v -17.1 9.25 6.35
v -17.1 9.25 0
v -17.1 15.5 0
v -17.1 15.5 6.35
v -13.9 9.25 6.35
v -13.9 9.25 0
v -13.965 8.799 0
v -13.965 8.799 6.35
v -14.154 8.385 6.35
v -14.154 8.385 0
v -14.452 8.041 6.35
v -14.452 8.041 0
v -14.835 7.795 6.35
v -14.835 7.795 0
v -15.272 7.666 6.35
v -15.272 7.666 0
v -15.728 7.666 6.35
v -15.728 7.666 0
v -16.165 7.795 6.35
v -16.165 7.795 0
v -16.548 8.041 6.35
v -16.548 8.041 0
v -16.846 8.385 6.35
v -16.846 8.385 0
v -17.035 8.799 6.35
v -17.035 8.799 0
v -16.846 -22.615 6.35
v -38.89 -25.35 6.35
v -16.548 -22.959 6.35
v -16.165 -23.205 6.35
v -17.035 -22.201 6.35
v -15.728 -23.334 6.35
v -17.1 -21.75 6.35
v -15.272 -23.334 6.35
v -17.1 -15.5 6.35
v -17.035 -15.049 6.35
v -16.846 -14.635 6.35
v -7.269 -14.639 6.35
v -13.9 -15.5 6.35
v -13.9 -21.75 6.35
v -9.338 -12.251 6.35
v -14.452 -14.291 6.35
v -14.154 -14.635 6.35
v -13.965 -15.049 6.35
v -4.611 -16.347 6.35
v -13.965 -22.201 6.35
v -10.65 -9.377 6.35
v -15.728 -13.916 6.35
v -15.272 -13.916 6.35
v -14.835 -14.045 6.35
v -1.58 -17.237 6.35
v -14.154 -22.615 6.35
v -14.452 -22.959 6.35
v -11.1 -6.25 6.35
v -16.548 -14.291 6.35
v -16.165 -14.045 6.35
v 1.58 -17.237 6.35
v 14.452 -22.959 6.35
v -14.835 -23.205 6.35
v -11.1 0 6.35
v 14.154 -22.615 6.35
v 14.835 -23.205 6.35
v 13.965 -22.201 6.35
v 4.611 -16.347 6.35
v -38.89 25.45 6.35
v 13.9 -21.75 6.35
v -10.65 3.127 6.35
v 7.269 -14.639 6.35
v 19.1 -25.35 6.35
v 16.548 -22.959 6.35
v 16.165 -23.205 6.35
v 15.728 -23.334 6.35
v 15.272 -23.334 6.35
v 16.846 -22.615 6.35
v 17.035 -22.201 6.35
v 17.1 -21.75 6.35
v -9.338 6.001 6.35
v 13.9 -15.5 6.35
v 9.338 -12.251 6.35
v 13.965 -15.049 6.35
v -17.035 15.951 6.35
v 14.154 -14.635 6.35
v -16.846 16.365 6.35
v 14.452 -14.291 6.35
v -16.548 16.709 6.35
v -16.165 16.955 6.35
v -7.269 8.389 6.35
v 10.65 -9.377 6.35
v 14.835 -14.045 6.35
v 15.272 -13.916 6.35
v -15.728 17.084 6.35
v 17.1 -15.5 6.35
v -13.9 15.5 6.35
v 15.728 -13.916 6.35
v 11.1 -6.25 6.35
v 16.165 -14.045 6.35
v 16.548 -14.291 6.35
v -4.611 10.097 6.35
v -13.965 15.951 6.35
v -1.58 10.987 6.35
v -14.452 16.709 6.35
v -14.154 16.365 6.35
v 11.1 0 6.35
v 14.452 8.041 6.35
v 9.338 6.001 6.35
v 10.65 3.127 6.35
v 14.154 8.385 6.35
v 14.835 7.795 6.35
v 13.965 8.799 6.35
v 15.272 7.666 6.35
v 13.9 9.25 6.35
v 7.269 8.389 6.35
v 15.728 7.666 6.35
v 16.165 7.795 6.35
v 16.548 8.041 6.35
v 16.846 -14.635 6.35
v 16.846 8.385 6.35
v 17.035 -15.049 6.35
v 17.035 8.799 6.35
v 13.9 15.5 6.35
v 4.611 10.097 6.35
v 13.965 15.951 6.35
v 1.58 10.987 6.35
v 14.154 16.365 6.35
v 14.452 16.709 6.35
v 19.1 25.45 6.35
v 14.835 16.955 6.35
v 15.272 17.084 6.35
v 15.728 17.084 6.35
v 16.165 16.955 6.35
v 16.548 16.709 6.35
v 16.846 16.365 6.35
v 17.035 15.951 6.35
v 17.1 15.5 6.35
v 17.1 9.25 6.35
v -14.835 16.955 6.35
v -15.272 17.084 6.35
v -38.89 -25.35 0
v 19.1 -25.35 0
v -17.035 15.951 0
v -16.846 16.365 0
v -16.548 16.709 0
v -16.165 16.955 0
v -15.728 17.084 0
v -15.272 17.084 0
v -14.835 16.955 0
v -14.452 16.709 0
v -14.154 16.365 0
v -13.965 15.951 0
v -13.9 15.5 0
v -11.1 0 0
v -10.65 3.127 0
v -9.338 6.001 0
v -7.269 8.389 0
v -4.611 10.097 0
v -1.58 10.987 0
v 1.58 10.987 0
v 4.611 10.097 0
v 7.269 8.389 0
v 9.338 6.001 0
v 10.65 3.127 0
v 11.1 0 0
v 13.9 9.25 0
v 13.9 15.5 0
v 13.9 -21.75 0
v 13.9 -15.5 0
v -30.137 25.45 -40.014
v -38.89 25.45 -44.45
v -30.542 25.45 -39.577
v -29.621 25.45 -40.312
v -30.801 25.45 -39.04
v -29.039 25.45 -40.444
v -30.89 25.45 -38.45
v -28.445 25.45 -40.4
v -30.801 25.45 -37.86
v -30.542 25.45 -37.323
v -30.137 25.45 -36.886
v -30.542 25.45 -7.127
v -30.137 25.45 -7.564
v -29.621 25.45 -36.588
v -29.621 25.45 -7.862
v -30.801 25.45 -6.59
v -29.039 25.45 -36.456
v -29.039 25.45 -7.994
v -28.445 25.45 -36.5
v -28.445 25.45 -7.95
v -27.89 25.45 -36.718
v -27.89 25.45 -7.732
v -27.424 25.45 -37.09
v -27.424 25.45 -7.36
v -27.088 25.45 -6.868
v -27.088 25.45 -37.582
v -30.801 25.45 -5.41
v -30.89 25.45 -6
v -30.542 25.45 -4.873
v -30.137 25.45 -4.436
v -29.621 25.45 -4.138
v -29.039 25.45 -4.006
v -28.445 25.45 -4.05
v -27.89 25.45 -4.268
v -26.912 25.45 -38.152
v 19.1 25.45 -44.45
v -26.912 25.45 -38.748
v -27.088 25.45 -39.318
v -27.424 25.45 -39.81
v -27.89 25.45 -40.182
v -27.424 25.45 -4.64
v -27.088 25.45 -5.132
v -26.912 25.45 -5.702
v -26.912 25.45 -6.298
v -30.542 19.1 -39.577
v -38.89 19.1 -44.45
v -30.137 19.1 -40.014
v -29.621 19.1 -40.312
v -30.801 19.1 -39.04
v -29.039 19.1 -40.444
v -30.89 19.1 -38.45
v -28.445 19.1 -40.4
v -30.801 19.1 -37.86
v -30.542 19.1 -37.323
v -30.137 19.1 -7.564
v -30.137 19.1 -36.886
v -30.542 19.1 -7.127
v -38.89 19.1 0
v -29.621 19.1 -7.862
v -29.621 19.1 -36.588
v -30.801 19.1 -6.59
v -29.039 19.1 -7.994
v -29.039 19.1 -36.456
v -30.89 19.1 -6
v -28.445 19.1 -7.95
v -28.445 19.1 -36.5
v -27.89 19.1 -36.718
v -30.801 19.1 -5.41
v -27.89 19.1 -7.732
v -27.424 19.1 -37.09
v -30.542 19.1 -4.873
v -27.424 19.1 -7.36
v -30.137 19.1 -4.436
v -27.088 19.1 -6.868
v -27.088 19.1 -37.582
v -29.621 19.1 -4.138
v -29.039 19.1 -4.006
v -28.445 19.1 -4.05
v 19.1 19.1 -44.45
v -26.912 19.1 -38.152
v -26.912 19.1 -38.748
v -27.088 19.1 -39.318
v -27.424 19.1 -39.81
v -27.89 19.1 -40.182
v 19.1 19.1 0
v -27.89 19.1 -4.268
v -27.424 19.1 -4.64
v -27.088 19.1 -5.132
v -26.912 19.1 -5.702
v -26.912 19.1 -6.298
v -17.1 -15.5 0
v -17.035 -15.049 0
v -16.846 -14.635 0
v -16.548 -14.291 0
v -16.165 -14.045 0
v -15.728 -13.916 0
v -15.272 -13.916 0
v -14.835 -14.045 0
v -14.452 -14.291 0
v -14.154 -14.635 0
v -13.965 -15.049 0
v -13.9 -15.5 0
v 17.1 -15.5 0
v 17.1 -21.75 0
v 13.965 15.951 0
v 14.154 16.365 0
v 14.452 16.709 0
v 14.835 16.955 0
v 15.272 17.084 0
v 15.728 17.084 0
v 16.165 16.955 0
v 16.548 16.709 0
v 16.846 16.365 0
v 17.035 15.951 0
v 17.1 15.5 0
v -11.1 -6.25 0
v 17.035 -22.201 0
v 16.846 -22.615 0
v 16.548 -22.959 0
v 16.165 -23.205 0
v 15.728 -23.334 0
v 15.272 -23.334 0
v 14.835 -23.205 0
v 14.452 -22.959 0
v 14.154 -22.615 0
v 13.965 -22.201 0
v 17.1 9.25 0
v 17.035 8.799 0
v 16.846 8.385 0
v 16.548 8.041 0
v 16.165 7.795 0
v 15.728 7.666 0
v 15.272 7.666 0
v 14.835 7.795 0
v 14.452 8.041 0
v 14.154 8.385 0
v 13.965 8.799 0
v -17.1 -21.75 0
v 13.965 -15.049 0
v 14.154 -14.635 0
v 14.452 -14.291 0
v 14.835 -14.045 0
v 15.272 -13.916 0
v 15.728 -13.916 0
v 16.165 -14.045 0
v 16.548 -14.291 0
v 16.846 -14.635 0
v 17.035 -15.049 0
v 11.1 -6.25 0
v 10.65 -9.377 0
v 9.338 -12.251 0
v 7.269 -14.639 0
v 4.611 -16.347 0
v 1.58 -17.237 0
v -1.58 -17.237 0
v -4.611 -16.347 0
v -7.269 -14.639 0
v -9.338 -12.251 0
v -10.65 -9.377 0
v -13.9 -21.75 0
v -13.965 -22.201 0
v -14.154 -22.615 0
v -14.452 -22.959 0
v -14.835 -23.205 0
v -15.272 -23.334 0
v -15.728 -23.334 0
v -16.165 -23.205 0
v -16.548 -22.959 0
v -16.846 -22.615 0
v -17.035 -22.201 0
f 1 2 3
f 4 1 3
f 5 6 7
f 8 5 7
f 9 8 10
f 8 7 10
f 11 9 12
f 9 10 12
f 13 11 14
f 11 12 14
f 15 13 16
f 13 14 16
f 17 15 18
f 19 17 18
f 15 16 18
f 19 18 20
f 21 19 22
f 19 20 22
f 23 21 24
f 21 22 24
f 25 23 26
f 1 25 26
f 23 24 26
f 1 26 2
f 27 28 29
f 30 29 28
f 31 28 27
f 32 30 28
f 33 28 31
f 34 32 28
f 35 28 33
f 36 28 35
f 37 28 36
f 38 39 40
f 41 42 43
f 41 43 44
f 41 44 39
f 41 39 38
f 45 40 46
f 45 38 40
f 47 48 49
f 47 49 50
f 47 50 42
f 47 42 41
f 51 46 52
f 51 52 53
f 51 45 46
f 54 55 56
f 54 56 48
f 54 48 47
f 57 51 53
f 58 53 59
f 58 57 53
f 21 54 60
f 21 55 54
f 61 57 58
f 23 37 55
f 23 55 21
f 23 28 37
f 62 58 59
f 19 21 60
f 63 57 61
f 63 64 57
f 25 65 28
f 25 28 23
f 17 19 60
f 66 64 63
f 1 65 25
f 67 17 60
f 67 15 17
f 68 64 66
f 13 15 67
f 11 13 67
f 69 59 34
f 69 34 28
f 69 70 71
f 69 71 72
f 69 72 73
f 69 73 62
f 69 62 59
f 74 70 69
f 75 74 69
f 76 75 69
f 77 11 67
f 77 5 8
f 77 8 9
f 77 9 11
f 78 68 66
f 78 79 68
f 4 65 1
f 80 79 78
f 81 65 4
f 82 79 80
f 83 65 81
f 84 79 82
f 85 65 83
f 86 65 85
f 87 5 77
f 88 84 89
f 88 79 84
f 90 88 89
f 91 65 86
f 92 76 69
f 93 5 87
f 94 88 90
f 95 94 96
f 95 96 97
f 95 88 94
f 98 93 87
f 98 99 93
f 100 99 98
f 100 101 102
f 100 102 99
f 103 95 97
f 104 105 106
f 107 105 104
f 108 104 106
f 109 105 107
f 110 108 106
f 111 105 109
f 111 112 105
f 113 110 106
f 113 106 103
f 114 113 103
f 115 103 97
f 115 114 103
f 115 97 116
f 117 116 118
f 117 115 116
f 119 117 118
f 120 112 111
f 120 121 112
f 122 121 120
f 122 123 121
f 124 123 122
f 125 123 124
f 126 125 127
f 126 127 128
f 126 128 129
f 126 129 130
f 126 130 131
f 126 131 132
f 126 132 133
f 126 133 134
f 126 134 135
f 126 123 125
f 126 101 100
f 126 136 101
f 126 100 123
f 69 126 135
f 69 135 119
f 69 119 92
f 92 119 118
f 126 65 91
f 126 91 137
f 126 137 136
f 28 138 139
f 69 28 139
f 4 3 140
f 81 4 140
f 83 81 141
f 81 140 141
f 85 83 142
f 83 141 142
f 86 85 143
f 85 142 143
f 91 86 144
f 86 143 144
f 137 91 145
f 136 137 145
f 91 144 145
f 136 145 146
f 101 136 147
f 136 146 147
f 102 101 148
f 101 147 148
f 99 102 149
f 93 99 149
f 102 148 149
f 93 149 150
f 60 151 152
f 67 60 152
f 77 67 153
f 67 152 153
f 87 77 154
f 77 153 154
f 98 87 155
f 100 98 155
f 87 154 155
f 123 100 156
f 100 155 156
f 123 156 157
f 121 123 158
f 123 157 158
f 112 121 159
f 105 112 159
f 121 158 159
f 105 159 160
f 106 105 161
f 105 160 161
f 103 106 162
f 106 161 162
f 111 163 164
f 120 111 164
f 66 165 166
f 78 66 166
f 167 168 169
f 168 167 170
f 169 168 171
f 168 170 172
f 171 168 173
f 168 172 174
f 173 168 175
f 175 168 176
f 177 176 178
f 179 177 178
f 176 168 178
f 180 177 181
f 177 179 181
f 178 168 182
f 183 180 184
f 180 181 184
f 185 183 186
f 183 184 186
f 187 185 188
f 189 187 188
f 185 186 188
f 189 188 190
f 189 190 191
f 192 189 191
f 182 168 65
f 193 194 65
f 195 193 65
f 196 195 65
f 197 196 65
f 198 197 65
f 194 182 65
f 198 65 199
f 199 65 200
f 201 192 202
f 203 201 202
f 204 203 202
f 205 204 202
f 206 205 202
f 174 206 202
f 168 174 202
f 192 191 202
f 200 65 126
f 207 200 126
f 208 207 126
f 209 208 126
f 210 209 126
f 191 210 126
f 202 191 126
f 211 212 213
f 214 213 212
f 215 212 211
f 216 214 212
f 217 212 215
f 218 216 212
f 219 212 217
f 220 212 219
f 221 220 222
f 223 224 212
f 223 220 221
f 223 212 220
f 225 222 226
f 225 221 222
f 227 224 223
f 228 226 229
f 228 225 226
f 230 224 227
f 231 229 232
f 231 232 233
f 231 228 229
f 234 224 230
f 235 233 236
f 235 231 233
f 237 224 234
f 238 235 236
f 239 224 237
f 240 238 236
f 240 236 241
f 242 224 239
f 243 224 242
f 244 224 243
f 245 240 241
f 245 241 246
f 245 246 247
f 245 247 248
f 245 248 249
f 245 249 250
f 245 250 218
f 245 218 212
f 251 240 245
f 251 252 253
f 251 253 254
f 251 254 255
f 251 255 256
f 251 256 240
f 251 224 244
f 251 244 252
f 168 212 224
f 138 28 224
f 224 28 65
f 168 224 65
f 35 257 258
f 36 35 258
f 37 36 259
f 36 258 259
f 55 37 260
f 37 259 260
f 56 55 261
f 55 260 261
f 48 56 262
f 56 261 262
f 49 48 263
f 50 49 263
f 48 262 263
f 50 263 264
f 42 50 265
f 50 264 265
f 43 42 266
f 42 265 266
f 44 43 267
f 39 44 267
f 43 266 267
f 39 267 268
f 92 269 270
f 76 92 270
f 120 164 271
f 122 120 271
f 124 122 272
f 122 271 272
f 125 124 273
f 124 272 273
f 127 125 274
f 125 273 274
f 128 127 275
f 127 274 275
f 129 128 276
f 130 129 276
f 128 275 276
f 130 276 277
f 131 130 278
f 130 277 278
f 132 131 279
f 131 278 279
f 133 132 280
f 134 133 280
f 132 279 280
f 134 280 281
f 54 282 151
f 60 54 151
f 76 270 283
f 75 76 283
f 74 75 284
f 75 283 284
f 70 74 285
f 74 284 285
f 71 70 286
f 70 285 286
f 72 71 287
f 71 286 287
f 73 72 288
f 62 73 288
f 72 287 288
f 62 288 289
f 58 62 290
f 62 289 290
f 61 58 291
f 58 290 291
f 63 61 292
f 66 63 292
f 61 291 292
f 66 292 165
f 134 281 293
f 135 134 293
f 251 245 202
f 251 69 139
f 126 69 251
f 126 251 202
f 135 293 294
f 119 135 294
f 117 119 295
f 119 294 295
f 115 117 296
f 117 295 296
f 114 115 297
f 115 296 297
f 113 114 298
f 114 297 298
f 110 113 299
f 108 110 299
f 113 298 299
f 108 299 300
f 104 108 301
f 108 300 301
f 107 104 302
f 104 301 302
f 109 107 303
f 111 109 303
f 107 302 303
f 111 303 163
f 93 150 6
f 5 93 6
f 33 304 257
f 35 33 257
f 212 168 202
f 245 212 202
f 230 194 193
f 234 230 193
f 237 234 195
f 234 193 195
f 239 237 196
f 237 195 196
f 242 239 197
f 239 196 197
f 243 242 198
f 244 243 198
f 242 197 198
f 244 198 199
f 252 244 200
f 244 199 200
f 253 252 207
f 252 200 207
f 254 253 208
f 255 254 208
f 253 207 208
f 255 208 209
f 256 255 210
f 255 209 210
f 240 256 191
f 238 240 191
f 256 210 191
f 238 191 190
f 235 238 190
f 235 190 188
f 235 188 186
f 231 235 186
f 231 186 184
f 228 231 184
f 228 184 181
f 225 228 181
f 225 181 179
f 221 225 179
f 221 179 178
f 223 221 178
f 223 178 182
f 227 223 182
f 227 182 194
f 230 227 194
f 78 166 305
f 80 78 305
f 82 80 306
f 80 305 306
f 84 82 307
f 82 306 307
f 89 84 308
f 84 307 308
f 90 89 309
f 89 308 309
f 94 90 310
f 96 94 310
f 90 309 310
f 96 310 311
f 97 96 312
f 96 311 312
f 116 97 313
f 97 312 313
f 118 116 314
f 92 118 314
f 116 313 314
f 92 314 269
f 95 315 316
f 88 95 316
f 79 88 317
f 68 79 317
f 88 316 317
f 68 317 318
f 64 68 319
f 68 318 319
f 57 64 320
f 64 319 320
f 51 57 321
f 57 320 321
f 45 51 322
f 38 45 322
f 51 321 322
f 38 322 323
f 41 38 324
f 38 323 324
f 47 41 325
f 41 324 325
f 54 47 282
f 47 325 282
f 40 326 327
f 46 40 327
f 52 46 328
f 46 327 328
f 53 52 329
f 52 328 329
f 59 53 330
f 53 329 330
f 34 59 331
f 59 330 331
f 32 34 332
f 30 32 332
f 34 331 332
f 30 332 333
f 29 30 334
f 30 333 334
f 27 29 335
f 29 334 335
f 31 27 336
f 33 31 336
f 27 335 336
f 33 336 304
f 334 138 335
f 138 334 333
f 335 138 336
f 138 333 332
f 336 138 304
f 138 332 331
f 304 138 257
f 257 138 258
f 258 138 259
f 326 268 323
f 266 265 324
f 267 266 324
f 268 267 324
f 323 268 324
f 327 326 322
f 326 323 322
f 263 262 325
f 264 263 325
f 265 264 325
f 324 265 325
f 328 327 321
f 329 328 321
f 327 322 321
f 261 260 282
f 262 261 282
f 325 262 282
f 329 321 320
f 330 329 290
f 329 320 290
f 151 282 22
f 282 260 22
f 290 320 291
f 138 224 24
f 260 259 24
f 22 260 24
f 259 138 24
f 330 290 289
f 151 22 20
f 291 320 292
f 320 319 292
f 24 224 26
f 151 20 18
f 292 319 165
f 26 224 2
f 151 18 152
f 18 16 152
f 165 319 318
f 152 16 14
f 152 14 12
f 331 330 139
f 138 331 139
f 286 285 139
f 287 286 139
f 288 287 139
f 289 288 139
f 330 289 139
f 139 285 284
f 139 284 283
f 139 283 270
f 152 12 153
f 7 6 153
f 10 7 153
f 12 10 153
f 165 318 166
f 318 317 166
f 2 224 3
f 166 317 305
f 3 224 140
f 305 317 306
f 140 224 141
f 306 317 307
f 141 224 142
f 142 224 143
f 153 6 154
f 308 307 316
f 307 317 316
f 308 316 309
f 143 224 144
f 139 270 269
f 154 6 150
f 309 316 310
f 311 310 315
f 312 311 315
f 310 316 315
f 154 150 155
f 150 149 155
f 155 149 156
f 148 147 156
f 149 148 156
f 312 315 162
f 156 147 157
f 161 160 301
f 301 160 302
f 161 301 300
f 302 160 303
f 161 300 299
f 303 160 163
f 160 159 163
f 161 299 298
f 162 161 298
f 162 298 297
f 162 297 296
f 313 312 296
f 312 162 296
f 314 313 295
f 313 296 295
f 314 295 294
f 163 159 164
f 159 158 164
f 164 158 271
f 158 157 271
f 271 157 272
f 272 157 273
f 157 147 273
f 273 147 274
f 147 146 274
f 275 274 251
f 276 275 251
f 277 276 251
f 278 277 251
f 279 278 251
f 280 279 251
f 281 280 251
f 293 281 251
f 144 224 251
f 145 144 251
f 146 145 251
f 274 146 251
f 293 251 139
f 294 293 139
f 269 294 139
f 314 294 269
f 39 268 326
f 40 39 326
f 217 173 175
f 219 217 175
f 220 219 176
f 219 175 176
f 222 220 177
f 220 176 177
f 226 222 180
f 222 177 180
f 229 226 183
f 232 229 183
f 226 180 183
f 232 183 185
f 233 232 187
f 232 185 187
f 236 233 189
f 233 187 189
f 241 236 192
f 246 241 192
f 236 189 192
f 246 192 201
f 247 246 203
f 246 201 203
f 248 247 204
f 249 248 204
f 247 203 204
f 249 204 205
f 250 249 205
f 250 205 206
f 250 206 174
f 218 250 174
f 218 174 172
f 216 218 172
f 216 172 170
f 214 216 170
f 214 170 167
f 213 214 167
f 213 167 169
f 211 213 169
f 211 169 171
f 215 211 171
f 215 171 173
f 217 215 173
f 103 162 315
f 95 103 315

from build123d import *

# Parameters (mm, degrees)
F0_W     = 57.99
F0_H     = 6.35
F0_H_2   = 44.45
F1_DEPTH = 6.35
F2_DEPTH = 44.45
F3_R     = 2
F4_DEPTH = 50.801


# Not quite as in the source:
# - a length typed as a fraction of an inch, garbled in the dataset ("3 / 203.2 mm" for 3/8 in), is restored
# - a feature names something its author has since deleted; it is built from what else it names


with BuildPart() as f1:
    # F0 (on Top) → F1 (new body)
    with BuildSketch(Plane.XY):
        with Locations((-9.895, 22.275)):
            Rectangle(F0_W, F0_H)
        with Locations((-9.895, -3.125)):
            Rectangle(F0_W, F0_H_2)
        with BuildLine():
            ThreePointArc((-17.1, -15.5), (-15.5, -13.9), (-13.9, -15.5))
            Line((-13.9, -15.5), (-13.9, -21.75))
            ThreePointArc((-13.9, -21.75), (-15.5, -23.35), (-17.1, -21.75))
            Line((-17.1, -21.75), (-17.1, -15.5))
        make_face(mode=Mode.SUBTRACT)
        with BuildLine():
            ThreePointArc((13.9, -15.5), (15.5, -13.9), (17.1, -15.5))
            Line((17.1, -15.5), (17.1, -21.75))
            ThreePointArc((17.1, -21.75), (15.5, -23.35), (13.9, -21.75))
            Line((13.9, -21.75), (13.9, -15.5))
        make_face(mode=Mode.SUBTRACT)
        with BuildLine():
            ThreePointArc((-11.1, 0), (0, 11.1), (11.1, 0))
            Line((11.1, 0), (11.1, -6.25))
            ThreePointArc((11.1, -6.25), (0, -17.35), (-11.1, -6.25))
            Line((-11.1, -6.25), (-11.1, 0))
        make_face(mode=Mode.SUBTRACT)
        with BuildLine():
            ThreePointArc((-17.1, 15.5), (-15.5, 17.1), (-13.9, 15.5))
            Line((-13.9, 15.5), (-13.9, 9.25))
            ThreePointArc((-13.9, 9.25), (-15.5, 7.65), (-17.1, 9.25))
            Line((-17.1, 9.25), (-17.1, 15.5))
        make_face(mode=Mode.SUBTRACT)
        with BuildLine():
            ThreePointArc((13.9, 15.5), (15.5, 17.1), (17.1, 15.5))
            Line((17.1, 15.5), (17.1, 9.25))
            ThreePointArc((17.1, 9.25), (15.5, 7.65), (13.9, 9.25))
            Line((13.9, 9.25), (13.9, 15.5))
        make_face(mode=Mode.SUBTRACT)
    extrude(amount=F1_DEPTH)

    # F0 (on Top) → F2 (join)
    with BuildSketch(Plane.XY):
        with Locations((-9.895, 22.275)):
            Rectangle(F0_W, F0_H)
    extrude(amount=-F2_DEPTH)

    # F3 (on face) → F4 (cut, through all)
    with BuildSketch(Plane(origin=(0, 25.45, 0), x_dir=(-1, 0, 0), z_dir=(0, 1, 0))):
        with Locations((28.89, -6)):
            Circle(F3_R)
        with Locations((28.89, -38.45)):
            Circle(F3_R)
    extrude(amount=-F4_DEPTH, mode=Mode.SUBTRACT)


solid = f1.part
